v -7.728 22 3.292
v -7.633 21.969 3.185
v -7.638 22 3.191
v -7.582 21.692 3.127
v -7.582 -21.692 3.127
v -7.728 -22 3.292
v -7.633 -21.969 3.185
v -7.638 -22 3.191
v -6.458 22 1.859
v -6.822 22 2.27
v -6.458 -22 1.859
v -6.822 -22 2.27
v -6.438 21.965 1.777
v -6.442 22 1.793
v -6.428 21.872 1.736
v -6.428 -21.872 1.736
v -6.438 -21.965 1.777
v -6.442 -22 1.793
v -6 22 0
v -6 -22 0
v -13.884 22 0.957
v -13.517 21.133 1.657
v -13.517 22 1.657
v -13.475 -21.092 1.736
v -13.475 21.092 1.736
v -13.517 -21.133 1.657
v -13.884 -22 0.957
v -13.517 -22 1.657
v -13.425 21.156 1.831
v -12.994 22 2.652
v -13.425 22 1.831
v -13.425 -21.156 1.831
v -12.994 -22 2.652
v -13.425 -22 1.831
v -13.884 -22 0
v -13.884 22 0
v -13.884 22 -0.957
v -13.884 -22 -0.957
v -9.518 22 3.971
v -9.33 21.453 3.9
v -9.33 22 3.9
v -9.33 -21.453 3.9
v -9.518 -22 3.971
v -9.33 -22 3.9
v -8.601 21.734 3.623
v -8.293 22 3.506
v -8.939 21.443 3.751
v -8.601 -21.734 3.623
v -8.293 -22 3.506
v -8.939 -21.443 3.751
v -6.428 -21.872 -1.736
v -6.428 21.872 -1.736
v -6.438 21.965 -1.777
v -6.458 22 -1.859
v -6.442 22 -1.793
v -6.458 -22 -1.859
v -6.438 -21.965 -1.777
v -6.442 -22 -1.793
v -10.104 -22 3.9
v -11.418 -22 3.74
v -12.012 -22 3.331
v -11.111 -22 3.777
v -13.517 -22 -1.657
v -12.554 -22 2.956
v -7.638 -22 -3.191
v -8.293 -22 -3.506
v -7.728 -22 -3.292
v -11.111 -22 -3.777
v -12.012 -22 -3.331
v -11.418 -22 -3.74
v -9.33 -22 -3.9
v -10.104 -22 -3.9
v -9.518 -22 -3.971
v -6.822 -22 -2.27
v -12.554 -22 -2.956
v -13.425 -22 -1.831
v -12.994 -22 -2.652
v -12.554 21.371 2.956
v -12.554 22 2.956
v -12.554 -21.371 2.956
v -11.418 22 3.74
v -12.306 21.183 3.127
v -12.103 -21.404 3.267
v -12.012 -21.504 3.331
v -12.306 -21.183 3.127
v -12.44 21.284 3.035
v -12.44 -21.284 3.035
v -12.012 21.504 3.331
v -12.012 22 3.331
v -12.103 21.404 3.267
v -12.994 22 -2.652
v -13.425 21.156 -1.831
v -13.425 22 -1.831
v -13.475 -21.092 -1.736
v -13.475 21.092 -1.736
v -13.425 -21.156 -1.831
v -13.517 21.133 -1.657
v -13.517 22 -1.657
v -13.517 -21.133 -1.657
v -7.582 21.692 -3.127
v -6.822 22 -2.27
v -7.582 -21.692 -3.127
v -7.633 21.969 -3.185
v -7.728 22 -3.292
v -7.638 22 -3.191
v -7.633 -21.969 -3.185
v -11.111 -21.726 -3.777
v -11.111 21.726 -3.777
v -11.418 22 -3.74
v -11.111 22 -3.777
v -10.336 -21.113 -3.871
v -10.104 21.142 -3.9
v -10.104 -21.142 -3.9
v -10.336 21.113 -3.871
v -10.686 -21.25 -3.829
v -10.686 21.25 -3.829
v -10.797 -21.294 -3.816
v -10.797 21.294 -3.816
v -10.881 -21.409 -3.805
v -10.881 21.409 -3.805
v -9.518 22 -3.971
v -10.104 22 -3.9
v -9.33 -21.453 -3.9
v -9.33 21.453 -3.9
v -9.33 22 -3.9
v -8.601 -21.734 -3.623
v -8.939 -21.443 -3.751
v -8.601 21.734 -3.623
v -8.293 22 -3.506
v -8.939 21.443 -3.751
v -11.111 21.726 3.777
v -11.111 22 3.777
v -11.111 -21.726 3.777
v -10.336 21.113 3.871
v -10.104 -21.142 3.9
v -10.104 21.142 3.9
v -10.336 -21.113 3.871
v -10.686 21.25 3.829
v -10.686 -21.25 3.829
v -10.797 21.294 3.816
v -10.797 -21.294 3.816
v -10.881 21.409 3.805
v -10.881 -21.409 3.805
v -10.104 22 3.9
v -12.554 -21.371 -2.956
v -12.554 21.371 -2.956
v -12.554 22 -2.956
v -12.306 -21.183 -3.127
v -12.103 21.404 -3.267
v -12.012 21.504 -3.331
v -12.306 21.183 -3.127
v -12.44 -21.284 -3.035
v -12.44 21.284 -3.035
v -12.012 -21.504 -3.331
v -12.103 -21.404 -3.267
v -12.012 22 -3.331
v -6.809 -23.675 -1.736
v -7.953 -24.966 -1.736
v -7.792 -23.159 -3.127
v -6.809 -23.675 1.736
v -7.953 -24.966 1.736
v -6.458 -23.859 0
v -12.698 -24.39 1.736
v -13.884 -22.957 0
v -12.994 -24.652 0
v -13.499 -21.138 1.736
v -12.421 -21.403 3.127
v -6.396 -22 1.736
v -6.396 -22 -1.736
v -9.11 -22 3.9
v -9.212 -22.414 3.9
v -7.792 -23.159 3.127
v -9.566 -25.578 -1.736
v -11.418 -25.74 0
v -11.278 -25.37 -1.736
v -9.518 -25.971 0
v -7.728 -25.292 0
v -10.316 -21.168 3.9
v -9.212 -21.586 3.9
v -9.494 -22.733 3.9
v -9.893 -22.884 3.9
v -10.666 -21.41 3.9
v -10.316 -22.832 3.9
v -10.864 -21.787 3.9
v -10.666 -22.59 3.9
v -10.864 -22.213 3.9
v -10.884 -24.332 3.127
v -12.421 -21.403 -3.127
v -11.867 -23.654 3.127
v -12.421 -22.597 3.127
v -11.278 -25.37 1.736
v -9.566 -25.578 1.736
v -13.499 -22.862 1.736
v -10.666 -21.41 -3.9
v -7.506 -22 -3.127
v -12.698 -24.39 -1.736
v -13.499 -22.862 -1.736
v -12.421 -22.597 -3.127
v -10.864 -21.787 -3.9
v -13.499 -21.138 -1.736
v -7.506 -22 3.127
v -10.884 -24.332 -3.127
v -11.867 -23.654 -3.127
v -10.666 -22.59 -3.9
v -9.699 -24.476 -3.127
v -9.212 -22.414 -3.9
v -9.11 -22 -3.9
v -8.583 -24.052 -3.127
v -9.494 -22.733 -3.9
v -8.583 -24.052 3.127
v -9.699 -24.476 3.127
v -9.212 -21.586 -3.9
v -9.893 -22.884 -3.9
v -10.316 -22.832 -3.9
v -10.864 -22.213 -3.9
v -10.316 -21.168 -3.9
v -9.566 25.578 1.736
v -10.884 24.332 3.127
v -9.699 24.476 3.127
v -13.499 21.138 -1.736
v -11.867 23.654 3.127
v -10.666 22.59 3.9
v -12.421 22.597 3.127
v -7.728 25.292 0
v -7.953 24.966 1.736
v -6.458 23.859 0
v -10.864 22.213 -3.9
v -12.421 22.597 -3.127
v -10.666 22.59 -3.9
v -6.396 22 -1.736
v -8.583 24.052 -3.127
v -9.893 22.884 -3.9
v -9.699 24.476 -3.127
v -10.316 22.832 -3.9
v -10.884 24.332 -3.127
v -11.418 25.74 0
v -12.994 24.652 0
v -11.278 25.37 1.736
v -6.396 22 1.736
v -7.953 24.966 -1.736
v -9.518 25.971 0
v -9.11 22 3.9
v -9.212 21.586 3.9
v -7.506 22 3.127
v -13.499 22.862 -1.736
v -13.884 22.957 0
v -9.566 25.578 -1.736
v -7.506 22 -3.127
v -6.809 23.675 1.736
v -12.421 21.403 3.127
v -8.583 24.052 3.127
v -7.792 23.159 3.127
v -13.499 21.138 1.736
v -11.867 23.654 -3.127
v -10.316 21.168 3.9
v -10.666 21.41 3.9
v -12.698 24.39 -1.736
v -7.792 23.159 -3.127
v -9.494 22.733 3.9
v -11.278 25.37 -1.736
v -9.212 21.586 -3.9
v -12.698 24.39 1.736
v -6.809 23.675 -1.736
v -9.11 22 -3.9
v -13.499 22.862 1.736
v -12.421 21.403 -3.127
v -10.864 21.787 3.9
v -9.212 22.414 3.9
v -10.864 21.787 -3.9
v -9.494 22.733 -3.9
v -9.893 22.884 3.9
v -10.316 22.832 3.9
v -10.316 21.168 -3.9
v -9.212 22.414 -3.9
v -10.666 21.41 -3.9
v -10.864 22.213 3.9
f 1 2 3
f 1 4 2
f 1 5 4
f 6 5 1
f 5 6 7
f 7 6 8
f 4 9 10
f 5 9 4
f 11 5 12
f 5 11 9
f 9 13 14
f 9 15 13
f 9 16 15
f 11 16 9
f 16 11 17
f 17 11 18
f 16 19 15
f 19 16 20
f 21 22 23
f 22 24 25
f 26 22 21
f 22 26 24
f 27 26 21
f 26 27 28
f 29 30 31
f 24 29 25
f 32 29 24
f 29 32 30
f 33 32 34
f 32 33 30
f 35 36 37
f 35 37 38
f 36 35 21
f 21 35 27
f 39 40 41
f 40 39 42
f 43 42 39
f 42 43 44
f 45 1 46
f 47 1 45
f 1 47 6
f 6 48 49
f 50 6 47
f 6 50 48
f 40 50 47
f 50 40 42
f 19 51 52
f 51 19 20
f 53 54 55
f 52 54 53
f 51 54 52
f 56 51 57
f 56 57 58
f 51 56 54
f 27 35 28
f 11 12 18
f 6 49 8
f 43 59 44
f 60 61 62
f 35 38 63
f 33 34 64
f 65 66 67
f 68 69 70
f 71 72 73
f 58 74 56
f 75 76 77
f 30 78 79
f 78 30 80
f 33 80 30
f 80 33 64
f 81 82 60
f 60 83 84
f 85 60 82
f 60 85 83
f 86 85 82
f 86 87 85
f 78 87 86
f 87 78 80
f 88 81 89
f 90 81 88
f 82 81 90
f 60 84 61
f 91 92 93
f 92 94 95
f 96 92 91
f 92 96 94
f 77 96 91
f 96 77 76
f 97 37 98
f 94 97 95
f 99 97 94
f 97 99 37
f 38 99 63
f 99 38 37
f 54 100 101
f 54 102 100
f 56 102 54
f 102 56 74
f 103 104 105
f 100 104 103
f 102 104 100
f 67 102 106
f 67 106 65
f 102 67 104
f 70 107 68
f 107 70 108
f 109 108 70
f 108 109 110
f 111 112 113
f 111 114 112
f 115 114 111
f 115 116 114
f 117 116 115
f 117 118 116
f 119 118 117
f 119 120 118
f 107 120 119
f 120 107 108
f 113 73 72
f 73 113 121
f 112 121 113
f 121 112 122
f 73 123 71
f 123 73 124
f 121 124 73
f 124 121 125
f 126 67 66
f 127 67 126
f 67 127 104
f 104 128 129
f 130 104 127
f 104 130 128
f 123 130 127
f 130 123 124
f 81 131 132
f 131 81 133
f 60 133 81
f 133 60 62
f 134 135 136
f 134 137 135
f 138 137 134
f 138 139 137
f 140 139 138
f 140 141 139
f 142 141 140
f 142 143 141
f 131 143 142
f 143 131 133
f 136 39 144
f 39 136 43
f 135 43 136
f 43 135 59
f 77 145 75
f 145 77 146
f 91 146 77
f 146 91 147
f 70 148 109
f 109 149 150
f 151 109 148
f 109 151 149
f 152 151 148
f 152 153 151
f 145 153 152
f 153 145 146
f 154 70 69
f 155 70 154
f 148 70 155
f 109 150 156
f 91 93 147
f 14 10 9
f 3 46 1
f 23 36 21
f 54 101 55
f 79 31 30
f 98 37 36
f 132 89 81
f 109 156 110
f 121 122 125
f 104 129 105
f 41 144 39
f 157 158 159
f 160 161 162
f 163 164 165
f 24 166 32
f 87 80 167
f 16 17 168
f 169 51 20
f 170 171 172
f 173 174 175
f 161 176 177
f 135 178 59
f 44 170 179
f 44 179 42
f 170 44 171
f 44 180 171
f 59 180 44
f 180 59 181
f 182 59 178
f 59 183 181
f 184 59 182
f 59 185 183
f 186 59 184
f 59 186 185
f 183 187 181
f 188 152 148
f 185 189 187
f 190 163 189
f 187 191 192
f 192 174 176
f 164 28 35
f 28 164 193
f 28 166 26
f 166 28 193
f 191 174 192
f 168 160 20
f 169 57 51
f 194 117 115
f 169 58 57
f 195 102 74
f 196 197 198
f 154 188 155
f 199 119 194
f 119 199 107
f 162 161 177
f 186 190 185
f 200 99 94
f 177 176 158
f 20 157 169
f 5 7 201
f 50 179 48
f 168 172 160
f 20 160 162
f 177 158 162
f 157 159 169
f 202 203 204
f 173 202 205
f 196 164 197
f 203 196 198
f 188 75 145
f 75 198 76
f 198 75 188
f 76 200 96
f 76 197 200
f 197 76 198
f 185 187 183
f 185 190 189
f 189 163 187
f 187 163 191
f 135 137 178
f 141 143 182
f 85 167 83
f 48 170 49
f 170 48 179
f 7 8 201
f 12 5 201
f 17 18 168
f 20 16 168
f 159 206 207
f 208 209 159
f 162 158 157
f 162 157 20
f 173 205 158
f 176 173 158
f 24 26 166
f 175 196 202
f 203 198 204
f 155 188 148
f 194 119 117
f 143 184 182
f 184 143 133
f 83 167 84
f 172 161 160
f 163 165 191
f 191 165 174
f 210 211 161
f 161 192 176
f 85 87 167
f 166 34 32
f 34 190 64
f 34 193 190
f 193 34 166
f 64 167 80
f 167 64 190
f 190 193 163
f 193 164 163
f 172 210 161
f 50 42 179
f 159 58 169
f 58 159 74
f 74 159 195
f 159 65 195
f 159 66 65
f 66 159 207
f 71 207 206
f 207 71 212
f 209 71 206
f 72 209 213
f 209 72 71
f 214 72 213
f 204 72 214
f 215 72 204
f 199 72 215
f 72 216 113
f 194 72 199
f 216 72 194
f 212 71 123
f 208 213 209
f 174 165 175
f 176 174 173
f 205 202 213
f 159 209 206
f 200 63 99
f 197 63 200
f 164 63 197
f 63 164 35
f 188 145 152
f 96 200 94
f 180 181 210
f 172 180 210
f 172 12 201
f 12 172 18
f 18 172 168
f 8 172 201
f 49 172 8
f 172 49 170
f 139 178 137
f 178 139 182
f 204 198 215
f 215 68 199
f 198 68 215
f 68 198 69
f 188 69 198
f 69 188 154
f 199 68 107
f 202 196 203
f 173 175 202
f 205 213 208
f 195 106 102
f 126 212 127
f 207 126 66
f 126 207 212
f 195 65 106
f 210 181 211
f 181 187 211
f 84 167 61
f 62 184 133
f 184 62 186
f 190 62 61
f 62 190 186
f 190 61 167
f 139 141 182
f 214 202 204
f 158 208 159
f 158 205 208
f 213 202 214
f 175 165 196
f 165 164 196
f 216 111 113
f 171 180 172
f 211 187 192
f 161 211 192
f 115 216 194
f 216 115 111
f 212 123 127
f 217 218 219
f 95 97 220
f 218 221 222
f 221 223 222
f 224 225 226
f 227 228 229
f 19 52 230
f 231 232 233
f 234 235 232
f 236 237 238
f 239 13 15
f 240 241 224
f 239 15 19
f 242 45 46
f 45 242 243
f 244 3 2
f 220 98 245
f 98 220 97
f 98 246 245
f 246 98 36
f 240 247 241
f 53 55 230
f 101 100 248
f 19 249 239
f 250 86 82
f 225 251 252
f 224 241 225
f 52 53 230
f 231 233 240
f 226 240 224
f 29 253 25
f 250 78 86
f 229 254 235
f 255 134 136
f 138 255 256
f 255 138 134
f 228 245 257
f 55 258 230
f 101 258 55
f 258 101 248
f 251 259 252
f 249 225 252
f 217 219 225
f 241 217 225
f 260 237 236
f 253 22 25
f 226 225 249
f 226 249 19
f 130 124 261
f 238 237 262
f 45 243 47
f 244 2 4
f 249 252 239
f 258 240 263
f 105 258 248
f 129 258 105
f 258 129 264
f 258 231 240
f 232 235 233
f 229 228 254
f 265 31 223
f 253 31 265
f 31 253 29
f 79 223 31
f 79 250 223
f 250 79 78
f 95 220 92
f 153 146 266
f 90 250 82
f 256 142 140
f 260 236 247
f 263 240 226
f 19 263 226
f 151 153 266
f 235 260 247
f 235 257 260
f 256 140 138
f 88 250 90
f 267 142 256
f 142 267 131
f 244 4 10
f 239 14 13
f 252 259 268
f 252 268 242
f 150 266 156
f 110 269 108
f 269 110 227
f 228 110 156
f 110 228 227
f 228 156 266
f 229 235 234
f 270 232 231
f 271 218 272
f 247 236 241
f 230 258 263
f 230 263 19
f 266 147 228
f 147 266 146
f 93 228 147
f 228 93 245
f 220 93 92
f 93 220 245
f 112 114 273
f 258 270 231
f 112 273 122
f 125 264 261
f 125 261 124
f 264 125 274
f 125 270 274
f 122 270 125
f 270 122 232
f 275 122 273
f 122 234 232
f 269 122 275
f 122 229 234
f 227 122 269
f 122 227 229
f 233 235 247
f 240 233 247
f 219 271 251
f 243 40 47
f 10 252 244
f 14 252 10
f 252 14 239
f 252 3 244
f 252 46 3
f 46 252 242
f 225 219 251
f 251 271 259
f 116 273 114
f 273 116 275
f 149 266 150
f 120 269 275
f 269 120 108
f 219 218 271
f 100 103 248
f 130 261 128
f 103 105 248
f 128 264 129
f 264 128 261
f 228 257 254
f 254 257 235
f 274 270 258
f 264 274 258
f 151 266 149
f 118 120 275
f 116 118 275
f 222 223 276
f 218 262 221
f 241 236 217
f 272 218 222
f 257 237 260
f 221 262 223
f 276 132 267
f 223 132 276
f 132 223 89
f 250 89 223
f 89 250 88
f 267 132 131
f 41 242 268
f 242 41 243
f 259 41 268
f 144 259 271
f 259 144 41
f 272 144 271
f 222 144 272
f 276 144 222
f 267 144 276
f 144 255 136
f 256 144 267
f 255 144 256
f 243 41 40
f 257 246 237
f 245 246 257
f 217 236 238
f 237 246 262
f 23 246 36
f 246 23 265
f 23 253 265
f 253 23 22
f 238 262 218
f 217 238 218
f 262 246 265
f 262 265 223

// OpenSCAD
side_x = 28;
side_y = 52;
side_fillet_r = 4;
thickness = 5;

print_lh = 0.2;

tol_xy = 0.1;
tol_z = print_lh;

module magnet_array(phi, height, spacing_x, spacing_y, count_x, count_y) {
  translate([-(count_x - 1)*spacing_x/2, -(count_y - 1)*spacing_y/2, 0]) {
    for (nx = [0:count_x - 1]) {
      for (ny = [0:count_y - 1]) {
        translate([nx*spacing_x, ny*spacing_y, 0]) cylinder(height, d=phi, false);
      }
    }
  }
}

module card () {
  // This works well and good, but has no nice fileting on the sides
  // union(){
  //   cube([side_x - 2*side_fillet_r, side_y, thickness], true);
  //   cube([side_x, side_y - 2*side_fillet_r, thickness], true);
  //   for (i = [-1:2:1]) {
  //     for (j = [-1:2:1]) {
  //       translate([i*(side_x/2 - side_fillet_r), j*(side_y/2 - side_fillet_r), 0]) 
  //         cylinder(thickness, r=side_fillet_r, center=true);
  //     }
  //   }
  // };
  union(){
    translate([-side_x/2 + side_fillet_r, 0, 0]) {
      rotate([90, 0, 0]) 
        cylinder(side_y - 2*side_fillet_r, r=side_fillet_r, center=true);
      translate([0, -side_y/2 + side_fillet_r, 0])
        sphere(r=side_fillet_r);
      translate([0, side_y/2 - side_fillet_r, 0])
        sphere(r=side_fillet_r);
    }
  };
}

card();
